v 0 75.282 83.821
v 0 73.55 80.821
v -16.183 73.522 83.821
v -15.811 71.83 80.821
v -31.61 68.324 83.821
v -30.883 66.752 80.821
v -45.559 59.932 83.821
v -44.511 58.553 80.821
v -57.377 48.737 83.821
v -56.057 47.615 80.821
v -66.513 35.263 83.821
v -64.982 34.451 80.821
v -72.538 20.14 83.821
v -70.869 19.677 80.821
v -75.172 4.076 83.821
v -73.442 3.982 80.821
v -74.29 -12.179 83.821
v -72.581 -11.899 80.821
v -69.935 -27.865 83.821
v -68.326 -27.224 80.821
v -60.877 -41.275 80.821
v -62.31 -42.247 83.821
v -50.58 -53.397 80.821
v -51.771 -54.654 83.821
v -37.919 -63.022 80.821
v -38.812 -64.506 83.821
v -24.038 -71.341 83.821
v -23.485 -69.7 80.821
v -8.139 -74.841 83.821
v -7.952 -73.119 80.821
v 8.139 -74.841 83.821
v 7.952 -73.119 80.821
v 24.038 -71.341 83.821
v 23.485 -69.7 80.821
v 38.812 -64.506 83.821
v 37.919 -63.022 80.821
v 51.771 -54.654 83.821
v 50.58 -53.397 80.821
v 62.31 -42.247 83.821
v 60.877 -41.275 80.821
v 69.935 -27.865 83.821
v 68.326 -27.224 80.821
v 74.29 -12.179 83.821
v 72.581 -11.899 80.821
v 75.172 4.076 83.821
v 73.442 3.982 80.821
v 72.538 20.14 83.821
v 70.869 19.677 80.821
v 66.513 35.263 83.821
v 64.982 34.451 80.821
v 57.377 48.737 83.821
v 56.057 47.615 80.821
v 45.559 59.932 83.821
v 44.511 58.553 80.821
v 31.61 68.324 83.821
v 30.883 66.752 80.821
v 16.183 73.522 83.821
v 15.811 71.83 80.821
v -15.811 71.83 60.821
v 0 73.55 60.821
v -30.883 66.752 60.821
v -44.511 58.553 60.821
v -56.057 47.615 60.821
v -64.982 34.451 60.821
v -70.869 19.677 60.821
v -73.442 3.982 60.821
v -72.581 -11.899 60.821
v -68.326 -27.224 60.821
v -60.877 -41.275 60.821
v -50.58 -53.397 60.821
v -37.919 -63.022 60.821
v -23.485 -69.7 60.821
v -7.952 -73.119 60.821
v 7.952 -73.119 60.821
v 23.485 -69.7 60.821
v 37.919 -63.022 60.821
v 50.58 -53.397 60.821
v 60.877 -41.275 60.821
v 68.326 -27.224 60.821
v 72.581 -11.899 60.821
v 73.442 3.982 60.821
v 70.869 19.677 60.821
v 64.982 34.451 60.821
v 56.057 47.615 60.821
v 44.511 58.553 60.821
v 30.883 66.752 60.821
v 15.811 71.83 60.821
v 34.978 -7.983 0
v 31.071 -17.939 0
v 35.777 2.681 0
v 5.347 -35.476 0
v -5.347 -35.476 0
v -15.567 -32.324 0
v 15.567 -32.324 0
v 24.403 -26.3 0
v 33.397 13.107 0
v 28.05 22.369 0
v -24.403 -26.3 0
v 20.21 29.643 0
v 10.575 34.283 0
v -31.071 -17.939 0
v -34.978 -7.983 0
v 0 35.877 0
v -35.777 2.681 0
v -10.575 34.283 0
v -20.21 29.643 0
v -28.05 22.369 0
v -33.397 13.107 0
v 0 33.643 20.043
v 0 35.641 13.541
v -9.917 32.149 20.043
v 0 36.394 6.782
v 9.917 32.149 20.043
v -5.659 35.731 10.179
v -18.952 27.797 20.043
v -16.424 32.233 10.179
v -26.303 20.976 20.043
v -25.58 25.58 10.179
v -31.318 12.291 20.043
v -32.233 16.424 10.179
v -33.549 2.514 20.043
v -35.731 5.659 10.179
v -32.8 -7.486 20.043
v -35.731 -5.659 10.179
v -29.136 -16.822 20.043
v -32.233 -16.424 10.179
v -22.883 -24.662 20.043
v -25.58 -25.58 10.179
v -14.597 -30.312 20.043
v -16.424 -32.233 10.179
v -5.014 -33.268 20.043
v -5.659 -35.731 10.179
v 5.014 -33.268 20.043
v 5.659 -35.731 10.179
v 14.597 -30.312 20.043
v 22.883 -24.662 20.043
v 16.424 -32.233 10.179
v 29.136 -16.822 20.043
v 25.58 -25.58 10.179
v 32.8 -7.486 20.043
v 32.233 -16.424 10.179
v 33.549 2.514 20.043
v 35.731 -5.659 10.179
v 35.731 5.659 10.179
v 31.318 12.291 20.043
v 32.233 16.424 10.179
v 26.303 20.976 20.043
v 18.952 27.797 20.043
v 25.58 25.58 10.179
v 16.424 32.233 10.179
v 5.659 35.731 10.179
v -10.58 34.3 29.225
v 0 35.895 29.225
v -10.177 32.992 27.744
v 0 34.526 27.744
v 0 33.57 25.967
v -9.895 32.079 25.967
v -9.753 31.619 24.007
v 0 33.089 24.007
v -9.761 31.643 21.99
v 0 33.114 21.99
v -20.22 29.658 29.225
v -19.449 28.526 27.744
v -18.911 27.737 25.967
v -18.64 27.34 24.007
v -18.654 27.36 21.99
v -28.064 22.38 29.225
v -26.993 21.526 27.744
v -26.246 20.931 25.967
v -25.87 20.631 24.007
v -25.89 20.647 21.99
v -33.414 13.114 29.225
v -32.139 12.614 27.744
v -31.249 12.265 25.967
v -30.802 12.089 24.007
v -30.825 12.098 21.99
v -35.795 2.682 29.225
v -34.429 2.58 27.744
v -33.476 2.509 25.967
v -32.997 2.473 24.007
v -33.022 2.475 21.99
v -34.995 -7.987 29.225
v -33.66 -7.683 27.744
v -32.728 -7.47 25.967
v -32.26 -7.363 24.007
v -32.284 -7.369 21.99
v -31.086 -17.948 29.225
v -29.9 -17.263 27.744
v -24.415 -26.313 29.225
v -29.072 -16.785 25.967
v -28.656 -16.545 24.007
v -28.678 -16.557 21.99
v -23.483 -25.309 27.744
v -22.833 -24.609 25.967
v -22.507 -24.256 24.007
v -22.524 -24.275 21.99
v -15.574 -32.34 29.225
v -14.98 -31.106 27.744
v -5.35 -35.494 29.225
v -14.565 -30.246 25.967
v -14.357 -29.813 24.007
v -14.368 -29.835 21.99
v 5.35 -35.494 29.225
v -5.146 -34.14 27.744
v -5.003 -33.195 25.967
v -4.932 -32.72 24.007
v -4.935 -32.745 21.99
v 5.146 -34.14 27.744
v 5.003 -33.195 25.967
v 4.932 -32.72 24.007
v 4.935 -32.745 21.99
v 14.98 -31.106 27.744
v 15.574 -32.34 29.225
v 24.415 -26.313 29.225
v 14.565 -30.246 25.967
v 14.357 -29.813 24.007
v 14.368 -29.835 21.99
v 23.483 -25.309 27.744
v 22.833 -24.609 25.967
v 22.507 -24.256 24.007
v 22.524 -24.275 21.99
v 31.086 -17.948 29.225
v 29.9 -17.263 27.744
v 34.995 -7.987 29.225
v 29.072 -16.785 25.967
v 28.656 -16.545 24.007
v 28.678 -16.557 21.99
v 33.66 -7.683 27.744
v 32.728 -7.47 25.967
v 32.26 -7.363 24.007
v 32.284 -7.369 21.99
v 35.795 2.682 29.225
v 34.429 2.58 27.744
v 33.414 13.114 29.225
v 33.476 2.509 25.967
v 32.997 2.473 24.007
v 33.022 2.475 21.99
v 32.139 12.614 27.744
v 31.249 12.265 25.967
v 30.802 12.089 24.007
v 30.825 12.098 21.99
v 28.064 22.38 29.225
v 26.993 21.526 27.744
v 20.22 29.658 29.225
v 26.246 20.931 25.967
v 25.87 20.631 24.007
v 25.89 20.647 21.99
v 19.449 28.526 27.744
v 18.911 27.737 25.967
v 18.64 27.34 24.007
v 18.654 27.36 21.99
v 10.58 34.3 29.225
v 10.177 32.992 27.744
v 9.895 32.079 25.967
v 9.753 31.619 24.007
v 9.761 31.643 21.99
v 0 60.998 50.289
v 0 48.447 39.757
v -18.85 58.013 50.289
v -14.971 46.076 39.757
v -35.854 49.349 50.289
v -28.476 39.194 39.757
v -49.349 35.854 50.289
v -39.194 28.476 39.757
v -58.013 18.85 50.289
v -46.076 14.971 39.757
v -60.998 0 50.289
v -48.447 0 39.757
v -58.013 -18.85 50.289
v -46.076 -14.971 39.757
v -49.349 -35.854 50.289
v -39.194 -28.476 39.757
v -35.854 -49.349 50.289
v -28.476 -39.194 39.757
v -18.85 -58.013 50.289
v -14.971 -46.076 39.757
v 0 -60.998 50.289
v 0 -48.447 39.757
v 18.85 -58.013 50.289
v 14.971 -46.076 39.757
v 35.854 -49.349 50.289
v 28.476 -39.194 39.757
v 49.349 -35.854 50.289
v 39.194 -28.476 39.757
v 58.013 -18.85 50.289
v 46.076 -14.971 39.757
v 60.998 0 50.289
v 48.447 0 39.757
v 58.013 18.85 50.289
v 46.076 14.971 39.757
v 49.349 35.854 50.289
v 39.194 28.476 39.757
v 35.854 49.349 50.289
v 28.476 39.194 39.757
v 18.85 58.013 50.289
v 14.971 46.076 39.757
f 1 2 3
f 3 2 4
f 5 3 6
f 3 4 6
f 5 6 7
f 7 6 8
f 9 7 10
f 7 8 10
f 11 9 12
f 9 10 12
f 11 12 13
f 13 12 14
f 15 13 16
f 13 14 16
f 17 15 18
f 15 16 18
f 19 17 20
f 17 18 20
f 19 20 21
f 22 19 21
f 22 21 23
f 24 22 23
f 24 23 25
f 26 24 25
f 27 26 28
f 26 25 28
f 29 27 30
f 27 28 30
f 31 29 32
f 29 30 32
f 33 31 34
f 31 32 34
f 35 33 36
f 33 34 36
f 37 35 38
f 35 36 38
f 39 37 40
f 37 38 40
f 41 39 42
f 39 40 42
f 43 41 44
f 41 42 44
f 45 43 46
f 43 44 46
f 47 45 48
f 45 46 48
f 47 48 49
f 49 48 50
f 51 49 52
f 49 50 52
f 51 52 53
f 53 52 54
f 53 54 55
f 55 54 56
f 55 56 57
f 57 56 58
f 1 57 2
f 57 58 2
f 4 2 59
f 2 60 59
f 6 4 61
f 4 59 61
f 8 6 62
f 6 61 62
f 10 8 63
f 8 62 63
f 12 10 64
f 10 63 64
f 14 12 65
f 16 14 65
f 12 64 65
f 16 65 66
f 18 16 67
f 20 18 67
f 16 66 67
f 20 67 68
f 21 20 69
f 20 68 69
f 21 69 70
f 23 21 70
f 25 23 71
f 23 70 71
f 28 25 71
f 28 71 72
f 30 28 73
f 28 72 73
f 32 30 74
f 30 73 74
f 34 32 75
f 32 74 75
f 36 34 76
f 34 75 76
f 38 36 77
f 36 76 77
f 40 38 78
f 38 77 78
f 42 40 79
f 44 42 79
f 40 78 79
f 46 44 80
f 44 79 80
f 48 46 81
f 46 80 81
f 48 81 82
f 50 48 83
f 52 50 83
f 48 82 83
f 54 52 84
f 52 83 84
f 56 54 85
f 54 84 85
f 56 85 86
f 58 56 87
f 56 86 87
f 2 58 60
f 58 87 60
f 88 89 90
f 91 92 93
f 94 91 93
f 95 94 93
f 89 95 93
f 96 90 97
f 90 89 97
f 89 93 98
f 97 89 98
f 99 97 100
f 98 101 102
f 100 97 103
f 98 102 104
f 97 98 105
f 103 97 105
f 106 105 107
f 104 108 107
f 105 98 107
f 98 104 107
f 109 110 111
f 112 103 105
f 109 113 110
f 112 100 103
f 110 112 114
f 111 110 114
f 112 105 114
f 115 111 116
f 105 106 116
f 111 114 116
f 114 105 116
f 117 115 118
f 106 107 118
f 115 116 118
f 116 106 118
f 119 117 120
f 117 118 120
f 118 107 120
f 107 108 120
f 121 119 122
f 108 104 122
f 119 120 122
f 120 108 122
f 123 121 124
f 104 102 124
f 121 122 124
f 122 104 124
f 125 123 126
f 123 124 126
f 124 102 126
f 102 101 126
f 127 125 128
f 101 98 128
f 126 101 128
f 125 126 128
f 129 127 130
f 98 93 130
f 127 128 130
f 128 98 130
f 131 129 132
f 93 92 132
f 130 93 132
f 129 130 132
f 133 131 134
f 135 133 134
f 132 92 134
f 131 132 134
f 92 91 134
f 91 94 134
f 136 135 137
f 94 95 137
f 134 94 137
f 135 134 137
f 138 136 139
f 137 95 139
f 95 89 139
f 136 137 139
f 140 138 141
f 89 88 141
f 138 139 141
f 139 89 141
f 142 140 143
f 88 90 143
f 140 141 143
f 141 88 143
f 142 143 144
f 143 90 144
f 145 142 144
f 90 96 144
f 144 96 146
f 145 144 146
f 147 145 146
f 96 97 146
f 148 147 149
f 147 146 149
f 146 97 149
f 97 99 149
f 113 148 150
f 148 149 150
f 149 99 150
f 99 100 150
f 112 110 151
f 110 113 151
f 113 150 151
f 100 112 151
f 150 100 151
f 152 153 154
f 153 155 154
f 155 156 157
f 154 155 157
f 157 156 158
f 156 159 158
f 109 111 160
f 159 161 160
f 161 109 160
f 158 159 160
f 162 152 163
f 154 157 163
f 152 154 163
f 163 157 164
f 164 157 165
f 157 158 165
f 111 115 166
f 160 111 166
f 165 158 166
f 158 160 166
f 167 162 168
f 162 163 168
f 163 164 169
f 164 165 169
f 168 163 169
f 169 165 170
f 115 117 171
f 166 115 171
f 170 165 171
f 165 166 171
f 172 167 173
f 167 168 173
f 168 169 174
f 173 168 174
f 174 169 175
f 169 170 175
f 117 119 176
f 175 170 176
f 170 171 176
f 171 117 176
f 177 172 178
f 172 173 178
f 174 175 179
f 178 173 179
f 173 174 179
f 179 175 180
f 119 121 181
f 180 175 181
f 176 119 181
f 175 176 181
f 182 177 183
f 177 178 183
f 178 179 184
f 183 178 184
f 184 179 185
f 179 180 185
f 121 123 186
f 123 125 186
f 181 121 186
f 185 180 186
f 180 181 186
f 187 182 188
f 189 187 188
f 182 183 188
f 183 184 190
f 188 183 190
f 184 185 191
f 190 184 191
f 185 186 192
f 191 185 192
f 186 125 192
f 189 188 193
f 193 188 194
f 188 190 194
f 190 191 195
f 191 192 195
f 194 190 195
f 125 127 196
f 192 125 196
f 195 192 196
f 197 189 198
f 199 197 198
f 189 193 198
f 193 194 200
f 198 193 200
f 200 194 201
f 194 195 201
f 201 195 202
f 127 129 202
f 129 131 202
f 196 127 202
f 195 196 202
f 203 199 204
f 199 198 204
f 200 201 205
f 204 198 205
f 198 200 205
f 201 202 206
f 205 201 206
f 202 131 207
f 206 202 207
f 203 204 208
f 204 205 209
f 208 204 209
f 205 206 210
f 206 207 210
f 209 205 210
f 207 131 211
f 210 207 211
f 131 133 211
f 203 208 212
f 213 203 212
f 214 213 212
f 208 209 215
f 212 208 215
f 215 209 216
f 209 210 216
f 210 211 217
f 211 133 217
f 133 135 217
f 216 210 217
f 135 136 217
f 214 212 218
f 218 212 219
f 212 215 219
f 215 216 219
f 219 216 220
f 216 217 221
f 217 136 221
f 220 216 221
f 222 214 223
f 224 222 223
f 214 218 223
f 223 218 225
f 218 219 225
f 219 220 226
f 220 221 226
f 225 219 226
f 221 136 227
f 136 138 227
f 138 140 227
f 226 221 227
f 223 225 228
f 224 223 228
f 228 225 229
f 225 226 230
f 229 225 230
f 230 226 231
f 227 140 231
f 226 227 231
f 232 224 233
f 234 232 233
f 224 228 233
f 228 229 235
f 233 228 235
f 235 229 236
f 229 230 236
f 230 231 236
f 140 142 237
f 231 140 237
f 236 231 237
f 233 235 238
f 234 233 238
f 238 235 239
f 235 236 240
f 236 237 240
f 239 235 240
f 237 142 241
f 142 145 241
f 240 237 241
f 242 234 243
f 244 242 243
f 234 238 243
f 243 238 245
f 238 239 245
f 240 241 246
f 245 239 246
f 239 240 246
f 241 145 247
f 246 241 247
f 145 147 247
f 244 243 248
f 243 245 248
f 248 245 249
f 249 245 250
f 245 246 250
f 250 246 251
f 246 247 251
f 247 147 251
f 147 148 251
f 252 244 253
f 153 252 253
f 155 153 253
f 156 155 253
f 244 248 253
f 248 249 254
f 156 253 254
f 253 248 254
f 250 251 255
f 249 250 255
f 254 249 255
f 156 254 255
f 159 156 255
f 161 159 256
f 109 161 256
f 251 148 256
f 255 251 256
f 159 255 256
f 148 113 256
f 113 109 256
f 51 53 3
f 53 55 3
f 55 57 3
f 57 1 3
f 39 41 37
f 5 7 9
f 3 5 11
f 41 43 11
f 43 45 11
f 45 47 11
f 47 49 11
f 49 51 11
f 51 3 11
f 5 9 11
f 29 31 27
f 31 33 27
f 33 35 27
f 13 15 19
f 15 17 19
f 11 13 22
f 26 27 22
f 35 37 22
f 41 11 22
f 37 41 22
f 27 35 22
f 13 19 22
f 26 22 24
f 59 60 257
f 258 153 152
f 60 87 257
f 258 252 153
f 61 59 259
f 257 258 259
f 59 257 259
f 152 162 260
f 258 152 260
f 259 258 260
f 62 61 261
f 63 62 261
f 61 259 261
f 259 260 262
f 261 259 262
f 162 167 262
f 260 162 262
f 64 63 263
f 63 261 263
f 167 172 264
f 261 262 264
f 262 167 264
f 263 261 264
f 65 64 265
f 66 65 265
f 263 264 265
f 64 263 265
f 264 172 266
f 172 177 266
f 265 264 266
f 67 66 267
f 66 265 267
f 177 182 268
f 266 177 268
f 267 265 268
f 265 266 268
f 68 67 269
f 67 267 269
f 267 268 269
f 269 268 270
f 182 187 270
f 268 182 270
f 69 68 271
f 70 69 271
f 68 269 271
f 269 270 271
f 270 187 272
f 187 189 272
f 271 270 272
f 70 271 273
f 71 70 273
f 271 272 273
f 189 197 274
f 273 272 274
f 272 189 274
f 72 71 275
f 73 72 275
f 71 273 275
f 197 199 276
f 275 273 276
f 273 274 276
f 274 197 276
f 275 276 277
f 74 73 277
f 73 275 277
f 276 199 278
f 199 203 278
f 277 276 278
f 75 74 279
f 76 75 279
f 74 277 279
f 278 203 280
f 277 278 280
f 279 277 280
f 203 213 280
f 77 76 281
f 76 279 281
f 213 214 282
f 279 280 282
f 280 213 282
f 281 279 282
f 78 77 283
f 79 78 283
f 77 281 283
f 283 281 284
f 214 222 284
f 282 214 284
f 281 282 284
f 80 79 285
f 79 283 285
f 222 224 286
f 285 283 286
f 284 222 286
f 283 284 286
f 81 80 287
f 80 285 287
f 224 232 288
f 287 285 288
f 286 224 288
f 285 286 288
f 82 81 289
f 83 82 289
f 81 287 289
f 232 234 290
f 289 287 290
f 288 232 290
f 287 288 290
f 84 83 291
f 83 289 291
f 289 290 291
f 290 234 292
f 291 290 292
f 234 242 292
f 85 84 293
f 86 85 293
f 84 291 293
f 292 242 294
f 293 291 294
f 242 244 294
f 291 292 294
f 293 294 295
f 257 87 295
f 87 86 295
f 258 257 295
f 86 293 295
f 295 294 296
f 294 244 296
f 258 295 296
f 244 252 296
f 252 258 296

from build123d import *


with BuildPart() as part:
    # Sketch1 → Revolve1 (revolve)
    with BuildSketch(Plane(origin=(0, 0, 0), x_dir=(0, 0, -1), z_dir=(1, 0, 0))):
        with BuildLine():
            Line((0, 0), (-50.959835356, 0))
            Line((-50.959835356, 0), (-83.8211217, 0))
            Line((-83.8211217, 0), (-83.8211217, 75.282050808))
            Line((-83.8211217, 75.282050808), (-80.8211217, 73.55))
            Line((-80.8211217, 73.55), (-60.8211217, 73.55))
            Line((-60.8211217, 73.55), (-29.224979598, 35.895184138))
            ThreePointArc((-29.224979598, 35.895184138), (-25.002056634, 33.267714962), (-20.042663952, 33.643343571))
            ThreePointArc((-20.042663952, 33.643343571), (-10.179122164, 36.1760026), (0, 35.877187771))
            Line((0, 35.877187771), (0, 34.862194457))
            Line((0, 34.862194457), (0, 0))
        make_face()
    revolve(axis=Axis((0, 0, 0), (0, 0, 1)))


solid = part.part
